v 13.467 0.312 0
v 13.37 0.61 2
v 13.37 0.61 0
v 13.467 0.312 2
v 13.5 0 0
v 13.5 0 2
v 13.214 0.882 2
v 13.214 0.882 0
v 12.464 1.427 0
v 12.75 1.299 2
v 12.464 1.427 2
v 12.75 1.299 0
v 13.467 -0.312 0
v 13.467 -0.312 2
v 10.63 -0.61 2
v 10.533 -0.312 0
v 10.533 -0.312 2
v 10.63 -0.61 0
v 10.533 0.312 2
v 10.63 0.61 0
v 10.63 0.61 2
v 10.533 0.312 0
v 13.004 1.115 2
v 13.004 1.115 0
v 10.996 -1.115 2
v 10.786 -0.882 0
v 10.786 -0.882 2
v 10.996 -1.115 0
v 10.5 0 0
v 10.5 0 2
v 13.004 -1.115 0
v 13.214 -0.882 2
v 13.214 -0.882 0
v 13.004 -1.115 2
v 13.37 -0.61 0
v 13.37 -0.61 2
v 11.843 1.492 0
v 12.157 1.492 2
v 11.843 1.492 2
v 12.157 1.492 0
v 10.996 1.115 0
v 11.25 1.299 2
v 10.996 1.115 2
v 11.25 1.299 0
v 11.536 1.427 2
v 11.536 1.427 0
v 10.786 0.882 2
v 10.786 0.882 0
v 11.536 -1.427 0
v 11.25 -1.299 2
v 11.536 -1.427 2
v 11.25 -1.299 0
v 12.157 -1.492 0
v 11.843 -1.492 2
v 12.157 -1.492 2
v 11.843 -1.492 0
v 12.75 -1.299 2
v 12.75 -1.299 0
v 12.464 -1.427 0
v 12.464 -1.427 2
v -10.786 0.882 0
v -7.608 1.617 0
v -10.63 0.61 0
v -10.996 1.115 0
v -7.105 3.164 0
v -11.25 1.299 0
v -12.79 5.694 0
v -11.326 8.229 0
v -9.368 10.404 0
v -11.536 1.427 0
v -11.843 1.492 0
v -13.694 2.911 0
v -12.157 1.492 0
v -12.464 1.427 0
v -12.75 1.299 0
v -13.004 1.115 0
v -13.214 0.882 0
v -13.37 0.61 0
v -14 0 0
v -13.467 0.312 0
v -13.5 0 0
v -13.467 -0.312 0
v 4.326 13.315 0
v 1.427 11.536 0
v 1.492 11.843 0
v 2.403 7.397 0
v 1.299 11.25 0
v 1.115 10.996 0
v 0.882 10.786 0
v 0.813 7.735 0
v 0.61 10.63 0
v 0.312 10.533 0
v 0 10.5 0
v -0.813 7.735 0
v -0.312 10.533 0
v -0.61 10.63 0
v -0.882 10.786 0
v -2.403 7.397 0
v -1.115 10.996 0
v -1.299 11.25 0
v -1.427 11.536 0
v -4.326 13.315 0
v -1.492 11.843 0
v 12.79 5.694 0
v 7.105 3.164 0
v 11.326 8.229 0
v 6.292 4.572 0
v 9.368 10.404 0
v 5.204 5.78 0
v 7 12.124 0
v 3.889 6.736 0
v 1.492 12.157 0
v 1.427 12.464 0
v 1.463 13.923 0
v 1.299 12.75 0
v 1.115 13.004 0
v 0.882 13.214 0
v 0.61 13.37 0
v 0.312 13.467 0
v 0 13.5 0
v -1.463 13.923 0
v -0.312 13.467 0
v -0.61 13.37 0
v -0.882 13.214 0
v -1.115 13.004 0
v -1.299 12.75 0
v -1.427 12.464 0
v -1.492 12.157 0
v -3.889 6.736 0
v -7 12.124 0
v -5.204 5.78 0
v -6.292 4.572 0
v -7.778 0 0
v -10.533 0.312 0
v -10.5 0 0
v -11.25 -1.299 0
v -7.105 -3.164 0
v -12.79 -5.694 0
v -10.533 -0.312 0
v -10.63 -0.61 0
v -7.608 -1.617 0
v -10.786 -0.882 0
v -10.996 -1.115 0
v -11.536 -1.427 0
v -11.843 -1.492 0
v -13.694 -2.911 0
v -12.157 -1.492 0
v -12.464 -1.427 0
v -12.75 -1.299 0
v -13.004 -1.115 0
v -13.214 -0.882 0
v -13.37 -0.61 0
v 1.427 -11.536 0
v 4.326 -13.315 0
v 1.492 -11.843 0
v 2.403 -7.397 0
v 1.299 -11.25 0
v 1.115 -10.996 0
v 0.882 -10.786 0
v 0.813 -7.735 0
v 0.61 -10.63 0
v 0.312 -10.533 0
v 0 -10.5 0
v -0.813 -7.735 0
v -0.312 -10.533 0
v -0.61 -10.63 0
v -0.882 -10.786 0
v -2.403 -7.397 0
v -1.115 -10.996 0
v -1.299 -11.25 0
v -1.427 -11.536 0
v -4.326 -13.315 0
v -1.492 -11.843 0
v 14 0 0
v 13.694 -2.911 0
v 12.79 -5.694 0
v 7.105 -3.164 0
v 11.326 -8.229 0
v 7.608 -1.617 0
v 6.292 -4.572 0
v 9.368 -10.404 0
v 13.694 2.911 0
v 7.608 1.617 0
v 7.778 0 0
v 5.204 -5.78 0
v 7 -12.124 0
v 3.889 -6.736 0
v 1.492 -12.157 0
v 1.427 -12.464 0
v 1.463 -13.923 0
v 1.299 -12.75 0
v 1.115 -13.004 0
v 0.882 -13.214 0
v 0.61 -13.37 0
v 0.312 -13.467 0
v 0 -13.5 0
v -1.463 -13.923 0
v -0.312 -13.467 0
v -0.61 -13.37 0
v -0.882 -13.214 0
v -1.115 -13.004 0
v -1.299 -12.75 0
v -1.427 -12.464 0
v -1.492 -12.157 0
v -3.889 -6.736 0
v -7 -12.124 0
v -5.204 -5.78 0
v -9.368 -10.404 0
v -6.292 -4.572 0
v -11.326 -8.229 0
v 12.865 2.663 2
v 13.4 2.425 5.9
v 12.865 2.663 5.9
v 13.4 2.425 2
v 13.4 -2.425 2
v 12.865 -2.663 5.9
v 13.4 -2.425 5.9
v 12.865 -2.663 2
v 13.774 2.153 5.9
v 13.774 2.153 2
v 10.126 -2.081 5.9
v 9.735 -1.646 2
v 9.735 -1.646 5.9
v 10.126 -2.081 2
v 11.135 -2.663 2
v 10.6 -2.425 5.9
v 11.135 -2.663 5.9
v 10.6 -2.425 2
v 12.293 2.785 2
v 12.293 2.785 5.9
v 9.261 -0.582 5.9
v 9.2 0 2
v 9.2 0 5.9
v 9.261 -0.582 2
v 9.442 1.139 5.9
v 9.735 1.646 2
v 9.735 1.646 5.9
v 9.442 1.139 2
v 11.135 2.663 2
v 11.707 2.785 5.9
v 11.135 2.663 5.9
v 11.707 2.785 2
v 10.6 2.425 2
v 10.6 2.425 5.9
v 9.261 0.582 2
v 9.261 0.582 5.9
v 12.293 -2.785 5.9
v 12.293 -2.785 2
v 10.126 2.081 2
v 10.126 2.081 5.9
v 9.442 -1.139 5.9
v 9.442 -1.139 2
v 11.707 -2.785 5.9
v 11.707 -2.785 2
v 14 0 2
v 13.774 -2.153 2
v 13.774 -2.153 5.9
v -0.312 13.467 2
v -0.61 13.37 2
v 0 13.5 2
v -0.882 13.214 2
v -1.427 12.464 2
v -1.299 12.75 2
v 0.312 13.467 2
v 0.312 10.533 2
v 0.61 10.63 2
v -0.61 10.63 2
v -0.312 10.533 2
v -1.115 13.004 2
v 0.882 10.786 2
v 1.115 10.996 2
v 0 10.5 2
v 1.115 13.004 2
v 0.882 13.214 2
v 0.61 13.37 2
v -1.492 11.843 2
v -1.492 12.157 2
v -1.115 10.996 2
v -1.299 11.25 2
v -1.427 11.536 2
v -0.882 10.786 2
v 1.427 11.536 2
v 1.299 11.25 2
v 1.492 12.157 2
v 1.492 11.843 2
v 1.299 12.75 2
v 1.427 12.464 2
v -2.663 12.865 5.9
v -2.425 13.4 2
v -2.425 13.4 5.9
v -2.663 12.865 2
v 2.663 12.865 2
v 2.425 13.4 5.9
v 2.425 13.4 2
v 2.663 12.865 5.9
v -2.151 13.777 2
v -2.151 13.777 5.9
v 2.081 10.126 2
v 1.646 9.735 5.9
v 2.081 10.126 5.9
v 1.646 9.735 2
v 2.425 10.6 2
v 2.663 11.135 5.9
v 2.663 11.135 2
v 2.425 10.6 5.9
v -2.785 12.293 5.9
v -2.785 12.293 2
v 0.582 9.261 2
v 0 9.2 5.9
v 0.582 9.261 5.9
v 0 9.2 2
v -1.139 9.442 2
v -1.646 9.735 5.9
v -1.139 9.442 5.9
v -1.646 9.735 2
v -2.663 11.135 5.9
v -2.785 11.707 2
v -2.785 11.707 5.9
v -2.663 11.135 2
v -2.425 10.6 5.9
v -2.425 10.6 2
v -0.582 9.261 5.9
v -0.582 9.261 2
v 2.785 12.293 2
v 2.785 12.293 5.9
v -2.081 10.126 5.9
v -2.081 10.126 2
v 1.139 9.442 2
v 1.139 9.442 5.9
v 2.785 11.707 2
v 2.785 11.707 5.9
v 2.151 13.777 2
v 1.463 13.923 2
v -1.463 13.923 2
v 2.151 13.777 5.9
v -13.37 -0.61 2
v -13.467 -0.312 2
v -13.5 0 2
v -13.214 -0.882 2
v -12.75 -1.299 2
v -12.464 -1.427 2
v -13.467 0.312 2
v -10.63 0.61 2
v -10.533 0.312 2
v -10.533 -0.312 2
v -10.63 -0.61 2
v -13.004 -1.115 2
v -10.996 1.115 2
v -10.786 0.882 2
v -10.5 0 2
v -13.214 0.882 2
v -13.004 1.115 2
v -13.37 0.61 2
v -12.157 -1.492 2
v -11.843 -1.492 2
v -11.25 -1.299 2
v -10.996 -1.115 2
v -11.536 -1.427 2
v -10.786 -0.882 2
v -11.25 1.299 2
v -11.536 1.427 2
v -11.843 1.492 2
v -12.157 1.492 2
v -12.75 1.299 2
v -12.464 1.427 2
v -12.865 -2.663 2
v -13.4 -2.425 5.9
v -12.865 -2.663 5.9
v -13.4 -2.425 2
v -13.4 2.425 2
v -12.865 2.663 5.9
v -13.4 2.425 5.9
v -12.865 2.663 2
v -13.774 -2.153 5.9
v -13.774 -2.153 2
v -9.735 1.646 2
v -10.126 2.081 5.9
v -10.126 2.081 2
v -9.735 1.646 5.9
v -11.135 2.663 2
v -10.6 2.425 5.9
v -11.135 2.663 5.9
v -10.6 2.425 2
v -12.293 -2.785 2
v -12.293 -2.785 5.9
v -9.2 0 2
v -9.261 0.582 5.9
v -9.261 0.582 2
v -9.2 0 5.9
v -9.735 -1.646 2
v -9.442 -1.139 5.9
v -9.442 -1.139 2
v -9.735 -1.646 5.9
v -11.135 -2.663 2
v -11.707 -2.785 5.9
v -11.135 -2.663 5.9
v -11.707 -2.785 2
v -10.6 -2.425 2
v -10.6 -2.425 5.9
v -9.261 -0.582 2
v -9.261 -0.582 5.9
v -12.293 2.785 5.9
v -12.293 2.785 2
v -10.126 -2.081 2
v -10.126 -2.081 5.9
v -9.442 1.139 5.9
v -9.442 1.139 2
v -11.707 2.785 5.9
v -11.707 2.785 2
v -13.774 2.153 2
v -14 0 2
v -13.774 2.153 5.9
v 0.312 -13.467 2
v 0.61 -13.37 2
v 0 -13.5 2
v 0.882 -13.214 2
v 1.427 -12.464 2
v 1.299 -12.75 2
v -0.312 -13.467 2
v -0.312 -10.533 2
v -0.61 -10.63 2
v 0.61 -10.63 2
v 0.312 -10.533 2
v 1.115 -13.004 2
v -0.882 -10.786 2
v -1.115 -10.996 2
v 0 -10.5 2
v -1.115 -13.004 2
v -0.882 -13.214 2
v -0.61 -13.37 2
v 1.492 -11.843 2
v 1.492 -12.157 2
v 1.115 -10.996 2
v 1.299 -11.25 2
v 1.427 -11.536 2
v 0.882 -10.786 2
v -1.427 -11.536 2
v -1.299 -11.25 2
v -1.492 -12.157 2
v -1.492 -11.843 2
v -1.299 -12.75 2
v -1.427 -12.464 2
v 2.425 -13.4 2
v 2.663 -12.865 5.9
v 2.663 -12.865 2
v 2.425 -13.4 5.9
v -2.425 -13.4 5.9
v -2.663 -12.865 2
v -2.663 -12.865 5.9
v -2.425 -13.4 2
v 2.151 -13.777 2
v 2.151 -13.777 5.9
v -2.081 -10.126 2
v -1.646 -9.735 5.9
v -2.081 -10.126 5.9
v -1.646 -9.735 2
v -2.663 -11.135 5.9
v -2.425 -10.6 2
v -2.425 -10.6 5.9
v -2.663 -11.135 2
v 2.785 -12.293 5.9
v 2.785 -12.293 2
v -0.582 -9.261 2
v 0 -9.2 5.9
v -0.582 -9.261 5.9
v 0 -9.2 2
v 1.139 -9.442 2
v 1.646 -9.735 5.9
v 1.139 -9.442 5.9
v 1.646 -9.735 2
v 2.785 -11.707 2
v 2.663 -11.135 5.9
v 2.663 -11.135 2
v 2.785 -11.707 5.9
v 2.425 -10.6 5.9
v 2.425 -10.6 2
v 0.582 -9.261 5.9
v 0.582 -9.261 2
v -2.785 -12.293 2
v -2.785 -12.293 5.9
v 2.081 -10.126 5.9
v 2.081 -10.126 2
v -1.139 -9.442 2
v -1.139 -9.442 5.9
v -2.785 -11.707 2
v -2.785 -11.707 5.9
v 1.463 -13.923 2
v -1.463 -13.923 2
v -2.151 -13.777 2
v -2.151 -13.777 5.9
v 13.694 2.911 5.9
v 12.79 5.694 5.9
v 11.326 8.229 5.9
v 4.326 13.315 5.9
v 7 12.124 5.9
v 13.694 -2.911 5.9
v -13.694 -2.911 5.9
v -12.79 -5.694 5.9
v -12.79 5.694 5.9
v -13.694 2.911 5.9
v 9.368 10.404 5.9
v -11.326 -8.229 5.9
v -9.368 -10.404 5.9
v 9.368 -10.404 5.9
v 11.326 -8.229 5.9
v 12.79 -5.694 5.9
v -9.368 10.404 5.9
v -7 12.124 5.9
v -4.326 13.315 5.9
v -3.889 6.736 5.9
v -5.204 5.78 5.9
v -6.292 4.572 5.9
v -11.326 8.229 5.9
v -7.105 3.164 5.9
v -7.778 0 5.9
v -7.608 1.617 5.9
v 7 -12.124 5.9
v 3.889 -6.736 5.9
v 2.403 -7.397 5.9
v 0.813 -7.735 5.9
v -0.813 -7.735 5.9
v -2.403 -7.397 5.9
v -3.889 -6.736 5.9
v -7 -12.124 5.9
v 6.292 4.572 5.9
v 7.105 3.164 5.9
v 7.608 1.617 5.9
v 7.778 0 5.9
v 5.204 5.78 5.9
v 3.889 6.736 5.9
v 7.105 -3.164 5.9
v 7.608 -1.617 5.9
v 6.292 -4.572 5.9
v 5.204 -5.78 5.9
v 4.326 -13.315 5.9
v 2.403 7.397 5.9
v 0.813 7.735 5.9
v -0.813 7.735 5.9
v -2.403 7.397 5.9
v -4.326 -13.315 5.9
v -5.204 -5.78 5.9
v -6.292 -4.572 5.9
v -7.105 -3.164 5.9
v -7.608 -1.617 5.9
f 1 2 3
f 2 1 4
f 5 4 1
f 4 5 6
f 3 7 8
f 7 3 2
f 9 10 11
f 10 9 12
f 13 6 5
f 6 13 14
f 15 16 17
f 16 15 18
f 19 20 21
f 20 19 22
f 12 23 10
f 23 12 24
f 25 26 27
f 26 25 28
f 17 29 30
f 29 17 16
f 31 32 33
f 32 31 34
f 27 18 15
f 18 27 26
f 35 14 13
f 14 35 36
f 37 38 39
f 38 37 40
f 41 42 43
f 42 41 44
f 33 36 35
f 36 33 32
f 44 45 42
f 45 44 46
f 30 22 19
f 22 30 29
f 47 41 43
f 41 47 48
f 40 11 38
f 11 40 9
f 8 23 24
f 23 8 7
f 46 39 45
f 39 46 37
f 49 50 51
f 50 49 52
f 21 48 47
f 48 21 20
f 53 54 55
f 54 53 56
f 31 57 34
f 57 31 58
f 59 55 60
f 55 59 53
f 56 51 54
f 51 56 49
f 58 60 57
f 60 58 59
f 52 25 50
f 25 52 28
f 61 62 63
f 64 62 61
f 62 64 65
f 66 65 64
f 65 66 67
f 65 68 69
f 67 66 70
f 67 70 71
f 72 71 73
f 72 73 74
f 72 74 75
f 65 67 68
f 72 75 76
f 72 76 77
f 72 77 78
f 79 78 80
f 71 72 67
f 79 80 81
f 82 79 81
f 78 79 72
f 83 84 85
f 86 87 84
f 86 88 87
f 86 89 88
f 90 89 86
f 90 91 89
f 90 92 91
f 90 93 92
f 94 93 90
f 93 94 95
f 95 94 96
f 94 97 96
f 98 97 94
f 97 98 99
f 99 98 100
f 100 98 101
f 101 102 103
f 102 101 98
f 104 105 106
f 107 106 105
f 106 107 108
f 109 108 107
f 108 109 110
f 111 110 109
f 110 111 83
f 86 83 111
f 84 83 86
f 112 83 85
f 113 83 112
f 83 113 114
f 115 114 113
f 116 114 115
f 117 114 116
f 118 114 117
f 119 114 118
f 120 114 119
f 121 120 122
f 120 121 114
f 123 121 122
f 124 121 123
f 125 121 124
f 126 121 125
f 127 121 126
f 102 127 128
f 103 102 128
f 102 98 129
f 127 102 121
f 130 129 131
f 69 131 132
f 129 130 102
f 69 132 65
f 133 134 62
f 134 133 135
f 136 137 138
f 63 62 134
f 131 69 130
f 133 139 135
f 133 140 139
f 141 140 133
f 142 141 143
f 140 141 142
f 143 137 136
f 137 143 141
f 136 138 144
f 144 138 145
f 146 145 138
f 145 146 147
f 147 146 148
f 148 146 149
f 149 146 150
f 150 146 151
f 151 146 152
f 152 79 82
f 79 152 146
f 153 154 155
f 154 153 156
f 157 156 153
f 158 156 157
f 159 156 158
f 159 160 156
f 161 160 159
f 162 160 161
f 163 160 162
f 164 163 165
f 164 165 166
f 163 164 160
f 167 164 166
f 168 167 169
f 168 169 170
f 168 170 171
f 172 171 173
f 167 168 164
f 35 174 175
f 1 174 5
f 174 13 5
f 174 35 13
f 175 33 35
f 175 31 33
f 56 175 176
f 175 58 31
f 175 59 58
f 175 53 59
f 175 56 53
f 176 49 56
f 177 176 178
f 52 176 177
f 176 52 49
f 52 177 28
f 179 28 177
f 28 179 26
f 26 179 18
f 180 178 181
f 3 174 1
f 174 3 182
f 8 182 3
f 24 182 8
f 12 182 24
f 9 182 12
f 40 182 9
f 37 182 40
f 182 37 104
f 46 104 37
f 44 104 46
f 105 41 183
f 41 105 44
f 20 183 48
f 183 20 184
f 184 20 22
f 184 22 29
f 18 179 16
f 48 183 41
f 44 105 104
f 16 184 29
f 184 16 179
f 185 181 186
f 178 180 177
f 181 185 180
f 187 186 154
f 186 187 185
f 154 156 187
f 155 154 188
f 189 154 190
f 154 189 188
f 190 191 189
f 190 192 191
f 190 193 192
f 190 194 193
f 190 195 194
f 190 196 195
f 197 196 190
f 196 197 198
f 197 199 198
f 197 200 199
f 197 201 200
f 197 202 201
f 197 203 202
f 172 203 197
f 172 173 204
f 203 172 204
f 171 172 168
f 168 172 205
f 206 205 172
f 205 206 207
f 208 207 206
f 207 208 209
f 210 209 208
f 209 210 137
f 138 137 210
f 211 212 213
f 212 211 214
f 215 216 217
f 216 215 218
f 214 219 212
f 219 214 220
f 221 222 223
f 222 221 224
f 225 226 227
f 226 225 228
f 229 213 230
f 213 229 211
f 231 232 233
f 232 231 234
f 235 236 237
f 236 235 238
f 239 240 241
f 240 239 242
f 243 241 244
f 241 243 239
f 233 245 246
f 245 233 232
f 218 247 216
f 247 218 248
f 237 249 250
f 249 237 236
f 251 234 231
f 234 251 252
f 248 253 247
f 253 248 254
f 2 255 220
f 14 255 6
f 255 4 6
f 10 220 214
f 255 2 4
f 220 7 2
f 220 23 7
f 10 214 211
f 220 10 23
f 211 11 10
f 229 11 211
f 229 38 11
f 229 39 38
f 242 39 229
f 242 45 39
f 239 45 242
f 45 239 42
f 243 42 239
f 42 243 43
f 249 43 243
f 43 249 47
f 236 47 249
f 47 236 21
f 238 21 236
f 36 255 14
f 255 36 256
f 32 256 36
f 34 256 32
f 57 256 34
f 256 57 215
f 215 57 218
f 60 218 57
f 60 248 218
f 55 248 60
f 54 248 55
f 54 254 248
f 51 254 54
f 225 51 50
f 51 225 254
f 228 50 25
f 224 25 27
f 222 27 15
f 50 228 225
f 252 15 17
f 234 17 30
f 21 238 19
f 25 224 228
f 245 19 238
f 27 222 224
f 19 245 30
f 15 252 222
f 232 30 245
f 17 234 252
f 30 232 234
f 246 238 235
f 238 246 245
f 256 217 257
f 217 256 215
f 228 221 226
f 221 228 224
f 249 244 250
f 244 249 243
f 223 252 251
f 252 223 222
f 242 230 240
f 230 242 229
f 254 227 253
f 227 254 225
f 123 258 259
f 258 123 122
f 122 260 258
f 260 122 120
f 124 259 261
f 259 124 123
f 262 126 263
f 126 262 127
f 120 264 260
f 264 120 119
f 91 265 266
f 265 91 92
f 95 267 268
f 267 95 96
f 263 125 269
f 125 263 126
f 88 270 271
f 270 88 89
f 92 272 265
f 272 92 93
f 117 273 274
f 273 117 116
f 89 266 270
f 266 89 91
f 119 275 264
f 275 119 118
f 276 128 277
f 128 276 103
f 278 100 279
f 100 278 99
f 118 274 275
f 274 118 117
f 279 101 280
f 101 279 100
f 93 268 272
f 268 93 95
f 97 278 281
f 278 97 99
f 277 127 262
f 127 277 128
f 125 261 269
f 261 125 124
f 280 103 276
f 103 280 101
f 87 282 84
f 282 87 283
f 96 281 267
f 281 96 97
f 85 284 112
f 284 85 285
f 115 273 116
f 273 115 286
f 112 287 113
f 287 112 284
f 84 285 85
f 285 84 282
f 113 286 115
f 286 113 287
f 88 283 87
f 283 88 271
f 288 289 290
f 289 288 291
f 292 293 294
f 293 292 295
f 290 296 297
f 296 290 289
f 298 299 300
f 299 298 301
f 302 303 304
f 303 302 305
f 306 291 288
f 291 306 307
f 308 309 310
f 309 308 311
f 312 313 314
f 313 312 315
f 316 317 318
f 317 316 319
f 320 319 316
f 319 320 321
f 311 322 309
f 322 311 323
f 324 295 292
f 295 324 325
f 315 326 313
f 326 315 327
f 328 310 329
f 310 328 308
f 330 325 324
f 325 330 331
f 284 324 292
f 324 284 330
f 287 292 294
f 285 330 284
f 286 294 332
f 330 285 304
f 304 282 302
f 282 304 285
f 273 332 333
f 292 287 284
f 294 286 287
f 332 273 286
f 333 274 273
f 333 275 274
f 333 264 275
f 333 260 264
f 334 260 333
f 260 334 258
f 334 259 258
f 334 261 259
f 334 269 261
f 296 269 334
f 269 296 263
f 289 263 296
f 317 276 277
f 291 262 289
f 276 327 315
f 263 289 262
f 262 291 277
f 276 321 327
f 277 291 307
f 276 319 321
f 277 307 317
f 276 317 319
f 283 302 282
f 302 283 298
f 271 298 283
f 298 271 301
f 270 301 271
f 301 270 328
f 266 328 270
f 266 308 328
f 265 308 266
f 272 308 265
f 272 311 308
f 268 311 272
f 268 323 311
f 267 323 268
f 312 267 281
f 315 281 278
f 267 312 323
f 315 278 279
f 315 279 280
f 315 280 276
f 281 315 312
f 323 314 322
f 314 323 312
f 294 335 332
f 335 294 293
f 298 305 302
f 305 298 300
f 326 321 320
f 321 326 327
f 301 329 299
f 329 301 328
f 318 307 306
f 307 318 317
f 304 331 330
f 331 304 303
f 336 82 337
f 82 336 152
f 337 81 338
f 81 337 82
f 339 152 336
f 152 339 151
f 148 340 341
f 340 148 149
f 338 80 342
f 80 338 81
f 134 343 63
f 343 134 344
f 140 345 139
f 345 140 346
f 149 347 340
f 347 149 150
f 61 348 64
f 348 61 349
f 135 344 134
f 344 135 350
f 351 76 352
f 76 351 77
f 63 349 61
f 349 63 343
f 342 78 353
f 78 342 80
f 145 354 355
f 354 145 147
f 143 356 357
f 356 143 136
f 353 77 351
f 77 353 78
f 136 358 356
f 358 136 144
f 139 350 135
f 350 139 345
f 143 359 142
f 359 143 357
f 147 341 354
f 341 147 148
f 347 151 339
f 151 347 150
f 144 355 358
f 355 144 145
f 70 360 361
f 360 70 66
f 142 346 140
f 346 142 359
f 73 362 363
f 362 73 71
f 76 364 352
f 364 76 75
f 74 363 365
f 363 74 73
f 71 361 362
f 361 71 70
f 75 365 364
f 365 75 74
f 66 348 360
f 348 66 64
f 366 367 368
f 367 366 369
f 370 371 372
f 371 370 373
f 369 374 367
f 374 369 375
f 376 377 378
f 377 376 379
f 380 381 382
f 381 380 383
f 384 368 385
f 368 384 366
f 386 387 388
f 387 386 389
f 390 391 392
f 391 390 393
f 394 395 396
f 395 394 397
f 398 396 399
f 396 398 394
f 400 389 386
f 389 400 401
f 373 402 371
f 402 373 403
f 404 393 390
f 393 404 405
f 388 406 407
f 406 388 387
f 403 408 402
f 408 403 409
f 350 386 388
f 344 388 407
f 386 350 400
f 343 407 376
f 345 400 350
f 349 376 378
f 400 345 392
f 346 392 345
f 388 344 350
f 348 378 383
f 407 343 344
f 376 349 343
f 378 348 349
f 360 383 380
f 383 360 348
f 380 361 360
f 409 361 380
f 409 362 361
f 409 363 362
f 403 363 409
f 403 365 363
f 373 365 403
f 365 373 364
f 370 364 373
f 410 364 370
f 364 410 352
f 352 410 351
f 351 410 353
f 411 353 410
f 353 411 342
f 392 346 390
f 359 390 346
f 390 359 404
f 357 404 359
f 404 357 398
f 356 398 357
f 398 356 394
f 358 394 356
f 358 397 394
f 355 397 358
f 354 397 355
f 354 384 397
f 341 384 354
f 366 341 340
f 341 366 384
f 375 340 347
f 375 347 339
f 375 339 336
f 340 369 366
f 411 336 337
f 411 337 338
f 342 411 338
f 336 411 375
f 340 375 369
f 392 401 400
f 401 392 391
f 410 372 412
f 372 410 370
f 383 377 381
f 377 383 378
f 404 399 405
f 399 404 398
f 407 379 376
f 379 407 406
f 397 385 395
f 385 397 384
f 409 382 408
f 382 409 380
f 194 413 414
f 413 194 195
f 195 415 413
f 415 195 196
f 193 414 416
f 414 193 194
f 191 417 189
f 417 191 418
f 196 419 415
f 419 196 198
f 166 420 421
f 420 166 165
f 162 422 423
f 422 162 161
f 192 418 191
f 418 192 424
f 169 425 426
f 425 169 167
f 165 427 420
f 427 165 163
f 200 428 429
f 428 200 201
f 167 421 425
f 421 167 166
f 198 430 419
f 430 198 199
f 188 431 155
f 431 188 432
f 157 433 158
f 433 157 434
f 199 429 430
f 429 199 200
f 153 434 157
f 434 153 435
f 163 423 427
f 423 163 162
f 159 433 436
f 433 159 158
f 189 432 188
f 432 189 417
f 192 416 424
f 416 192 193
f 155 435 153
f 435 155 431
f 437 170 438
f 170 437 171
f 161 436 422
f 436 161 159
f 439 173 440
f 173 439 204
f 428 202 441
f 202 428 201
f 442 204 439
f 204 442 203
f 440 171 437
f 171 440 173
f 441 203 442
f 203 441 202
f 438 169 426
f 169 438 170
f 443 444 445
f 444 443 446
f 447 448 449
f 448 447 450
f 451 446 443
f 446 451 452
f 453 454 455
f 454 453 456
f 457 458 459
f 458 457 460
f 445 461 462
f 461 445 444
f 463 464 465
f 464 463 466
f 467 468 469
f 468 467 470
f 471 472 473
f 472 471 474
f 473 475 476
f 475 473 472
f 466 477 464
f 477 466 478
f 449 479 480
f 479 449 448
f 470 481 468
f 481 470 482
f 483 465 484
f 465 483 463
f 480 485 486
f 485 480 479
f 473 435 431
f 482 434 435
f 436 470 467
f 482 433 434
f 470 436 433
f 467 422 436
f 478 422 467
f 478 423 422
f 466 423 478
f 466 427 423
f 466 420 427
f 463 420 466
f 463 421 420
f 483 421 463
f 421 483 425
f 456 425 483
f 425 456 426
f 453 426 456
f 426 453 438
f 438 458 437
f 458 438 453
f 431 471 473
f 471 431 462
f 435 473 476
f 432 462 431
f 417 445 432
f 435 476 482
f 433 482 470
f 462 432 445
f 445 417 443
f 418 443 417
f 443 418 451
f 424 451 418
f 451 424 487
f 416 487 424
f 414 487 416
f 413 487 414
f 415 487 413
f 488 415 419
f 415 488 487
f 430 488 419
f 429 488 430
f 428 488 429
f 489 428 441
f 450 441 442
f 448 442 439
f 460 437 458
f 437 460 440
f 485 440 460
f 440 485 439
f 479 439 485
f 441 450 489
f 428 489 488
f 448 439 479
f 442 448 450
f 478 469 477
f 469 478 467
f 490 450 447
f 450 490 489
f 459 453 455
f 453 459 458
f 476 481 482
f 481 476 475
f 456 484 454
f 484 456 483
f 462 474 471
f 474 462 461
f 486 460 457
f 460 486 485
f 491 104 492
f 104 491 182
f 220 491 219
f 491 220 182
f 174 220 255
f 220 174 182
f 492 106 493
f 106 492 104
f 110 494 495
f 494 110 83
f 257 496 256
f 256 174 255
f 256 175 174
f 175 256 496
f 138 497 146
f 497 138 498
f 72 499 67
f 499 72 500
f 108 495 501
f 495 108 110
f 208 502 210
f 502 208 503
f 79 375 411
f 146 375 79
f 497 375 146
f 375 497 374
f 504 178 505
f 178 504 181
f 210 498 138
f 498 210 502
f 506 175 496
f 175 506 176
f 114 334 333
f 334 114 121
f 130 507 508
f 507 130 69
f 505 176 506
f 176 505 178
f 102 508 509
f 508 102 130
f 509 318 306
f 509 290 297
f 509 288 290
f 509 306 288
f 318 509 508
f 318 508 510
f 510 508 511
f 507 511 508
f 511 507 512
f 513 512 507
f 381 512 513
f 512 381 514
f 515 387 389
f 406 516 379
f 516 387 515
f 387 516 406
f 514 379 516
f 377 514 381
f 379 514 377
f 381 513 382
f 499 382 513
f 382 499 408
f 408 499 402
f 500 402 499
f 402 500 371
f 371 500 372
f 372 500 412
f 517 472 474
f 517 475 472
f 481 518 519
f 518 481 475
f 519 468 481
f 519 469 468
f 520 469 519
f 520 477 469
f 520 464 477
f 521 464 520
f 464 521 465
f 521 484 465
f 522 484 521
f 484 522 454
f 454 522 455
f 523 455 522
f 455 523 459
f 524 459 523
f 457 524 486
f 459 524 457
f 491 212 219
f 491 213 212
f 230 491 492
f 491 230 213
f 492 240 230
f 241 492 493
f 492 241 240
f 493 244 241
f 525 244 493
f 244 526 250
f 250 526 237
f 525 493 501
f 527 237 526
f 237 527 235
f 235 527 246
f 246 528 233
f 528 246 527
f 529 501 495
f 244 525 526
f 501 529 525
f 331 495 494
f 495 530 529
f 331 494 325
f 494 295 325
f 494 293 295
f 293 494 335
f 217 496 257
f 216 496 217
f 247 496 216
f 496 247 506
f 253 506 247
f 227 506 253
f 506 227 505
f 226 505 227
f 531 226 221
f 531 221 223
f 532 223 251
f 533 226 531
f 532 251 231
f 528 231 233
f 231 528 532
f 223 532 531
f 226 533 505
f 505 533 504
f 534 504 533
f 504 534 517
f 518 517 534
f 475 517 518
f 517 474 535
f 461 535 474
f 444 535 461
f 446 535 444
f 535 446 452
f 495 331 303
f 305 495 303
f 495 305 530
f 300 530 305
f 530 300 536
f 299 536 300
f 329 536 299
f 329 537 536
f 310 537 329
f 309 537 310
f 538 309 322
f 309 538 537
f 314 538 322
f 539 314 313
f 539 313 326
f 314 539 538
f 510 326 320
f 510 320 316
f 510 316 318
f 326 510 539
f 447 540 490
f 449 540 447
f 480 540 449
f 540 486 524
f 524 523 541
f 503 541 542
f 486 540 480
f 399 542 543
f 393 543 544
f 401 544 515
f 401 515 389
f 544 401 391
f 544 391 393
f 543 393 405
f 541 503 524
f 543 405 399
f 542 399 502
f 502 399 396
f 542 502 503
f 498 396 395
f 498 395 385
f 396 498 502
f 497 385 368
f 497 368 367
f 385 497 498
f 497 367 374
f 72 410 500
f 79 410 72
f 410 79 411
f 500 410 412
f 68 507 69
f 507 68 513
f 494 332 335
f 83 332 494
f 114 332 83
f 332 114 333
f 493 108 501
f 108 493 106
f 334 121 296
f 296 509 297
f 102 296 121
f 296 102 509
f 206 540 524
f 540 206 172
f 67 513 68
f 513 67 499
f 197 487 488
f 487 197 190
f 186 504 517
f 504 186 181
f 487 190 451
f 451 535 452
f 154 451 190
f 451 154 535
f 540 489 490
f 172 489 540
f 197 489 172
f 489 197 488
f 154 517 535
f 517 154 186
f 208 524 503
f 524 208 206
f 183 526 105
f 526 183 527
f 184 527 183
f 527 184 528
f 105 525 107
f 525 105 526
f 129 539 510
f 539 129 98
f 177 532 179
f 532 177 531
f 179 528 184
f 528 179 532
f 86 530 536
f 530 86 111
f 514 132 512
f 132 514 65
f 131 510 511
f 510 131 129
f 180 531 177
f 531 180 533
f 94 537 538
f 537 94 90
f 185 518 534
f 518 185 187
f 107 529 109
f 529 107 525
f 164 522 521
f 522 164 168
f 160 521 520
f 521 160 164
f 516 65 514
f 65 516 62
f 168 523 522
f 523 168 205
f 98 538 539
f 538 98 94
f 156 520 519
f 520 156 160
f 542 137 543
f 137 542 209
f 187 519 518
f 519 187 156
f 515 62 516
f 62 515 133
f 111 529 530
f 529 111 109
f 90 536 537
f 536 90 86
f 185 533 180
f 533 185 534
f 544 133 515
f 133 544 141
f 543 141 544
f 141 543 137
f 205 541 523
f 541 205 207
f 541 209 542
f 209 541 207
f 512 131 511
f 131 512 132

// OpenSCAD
module foot ()
{
//millimeters

//Base Parameters
    radius = 14  ;
    height = 5.9 ;
	numberOfScrewHoles = 4;
	lowerThickness = 2 ;
//Diameter of Screw bolt
	screwSize = 3 ;
//Diameter of head size
	headSize = 5.6;

//Hole distance for the center
	distFromCenter = 12;


	difference() {
		cylinder(r=radius,h=height,center=false,$fs = 0.01);
		cylinder(r=radius/1.8,h=height,center=false,$fs = 0.01);
		holePattern( numberOfScrewHoles, lowerThickness, screwSize/2, headSize/2, distFromCenter );
	}
}

module screwHole (screwSize, headSize, lowerThickness)
{
	////Hole models are 13 mm
	totalThickness=30;
	cylinder(r=screwSize, h=totalThickness, center = false, $fs = 0.01);
		translate([0,0,lowerThickness])
			cylinder(r=headSize, h=totalThickness-lowerThickness, center = false, $fs = 0.01);
}

//module mountHoles (number, lowerThickness, screwSize, headSize)
module holePattern (number, lowerThickness, screwSize, headSize, distFromCenter)
{
	////Hole models are 13 mm
	totalThickness=13;
	for ( i = [0:number-1] ) {
		rotate(i*360/number)
			translate([distFromCenter,0,0]) 
				screwHole (screwSize, headSize, lowerThickness);
	}
}
//screwHole(1,2,5);
//holePattern(4,7,1,2,5);
foot();
//sphere(2, $fn=100);

//translate([0,0,-6])
//	cylinder(h= 6, r1 = 5, r2 = 8, center = false, $fn=100);
//translate([0,0,-36])
//	cylinder(h= 30, r1 = 4, r2 = 5, center = false, $fn=100);
//translate([0,0,-40])
//	sphere(7, $fn=100, center = false); 
